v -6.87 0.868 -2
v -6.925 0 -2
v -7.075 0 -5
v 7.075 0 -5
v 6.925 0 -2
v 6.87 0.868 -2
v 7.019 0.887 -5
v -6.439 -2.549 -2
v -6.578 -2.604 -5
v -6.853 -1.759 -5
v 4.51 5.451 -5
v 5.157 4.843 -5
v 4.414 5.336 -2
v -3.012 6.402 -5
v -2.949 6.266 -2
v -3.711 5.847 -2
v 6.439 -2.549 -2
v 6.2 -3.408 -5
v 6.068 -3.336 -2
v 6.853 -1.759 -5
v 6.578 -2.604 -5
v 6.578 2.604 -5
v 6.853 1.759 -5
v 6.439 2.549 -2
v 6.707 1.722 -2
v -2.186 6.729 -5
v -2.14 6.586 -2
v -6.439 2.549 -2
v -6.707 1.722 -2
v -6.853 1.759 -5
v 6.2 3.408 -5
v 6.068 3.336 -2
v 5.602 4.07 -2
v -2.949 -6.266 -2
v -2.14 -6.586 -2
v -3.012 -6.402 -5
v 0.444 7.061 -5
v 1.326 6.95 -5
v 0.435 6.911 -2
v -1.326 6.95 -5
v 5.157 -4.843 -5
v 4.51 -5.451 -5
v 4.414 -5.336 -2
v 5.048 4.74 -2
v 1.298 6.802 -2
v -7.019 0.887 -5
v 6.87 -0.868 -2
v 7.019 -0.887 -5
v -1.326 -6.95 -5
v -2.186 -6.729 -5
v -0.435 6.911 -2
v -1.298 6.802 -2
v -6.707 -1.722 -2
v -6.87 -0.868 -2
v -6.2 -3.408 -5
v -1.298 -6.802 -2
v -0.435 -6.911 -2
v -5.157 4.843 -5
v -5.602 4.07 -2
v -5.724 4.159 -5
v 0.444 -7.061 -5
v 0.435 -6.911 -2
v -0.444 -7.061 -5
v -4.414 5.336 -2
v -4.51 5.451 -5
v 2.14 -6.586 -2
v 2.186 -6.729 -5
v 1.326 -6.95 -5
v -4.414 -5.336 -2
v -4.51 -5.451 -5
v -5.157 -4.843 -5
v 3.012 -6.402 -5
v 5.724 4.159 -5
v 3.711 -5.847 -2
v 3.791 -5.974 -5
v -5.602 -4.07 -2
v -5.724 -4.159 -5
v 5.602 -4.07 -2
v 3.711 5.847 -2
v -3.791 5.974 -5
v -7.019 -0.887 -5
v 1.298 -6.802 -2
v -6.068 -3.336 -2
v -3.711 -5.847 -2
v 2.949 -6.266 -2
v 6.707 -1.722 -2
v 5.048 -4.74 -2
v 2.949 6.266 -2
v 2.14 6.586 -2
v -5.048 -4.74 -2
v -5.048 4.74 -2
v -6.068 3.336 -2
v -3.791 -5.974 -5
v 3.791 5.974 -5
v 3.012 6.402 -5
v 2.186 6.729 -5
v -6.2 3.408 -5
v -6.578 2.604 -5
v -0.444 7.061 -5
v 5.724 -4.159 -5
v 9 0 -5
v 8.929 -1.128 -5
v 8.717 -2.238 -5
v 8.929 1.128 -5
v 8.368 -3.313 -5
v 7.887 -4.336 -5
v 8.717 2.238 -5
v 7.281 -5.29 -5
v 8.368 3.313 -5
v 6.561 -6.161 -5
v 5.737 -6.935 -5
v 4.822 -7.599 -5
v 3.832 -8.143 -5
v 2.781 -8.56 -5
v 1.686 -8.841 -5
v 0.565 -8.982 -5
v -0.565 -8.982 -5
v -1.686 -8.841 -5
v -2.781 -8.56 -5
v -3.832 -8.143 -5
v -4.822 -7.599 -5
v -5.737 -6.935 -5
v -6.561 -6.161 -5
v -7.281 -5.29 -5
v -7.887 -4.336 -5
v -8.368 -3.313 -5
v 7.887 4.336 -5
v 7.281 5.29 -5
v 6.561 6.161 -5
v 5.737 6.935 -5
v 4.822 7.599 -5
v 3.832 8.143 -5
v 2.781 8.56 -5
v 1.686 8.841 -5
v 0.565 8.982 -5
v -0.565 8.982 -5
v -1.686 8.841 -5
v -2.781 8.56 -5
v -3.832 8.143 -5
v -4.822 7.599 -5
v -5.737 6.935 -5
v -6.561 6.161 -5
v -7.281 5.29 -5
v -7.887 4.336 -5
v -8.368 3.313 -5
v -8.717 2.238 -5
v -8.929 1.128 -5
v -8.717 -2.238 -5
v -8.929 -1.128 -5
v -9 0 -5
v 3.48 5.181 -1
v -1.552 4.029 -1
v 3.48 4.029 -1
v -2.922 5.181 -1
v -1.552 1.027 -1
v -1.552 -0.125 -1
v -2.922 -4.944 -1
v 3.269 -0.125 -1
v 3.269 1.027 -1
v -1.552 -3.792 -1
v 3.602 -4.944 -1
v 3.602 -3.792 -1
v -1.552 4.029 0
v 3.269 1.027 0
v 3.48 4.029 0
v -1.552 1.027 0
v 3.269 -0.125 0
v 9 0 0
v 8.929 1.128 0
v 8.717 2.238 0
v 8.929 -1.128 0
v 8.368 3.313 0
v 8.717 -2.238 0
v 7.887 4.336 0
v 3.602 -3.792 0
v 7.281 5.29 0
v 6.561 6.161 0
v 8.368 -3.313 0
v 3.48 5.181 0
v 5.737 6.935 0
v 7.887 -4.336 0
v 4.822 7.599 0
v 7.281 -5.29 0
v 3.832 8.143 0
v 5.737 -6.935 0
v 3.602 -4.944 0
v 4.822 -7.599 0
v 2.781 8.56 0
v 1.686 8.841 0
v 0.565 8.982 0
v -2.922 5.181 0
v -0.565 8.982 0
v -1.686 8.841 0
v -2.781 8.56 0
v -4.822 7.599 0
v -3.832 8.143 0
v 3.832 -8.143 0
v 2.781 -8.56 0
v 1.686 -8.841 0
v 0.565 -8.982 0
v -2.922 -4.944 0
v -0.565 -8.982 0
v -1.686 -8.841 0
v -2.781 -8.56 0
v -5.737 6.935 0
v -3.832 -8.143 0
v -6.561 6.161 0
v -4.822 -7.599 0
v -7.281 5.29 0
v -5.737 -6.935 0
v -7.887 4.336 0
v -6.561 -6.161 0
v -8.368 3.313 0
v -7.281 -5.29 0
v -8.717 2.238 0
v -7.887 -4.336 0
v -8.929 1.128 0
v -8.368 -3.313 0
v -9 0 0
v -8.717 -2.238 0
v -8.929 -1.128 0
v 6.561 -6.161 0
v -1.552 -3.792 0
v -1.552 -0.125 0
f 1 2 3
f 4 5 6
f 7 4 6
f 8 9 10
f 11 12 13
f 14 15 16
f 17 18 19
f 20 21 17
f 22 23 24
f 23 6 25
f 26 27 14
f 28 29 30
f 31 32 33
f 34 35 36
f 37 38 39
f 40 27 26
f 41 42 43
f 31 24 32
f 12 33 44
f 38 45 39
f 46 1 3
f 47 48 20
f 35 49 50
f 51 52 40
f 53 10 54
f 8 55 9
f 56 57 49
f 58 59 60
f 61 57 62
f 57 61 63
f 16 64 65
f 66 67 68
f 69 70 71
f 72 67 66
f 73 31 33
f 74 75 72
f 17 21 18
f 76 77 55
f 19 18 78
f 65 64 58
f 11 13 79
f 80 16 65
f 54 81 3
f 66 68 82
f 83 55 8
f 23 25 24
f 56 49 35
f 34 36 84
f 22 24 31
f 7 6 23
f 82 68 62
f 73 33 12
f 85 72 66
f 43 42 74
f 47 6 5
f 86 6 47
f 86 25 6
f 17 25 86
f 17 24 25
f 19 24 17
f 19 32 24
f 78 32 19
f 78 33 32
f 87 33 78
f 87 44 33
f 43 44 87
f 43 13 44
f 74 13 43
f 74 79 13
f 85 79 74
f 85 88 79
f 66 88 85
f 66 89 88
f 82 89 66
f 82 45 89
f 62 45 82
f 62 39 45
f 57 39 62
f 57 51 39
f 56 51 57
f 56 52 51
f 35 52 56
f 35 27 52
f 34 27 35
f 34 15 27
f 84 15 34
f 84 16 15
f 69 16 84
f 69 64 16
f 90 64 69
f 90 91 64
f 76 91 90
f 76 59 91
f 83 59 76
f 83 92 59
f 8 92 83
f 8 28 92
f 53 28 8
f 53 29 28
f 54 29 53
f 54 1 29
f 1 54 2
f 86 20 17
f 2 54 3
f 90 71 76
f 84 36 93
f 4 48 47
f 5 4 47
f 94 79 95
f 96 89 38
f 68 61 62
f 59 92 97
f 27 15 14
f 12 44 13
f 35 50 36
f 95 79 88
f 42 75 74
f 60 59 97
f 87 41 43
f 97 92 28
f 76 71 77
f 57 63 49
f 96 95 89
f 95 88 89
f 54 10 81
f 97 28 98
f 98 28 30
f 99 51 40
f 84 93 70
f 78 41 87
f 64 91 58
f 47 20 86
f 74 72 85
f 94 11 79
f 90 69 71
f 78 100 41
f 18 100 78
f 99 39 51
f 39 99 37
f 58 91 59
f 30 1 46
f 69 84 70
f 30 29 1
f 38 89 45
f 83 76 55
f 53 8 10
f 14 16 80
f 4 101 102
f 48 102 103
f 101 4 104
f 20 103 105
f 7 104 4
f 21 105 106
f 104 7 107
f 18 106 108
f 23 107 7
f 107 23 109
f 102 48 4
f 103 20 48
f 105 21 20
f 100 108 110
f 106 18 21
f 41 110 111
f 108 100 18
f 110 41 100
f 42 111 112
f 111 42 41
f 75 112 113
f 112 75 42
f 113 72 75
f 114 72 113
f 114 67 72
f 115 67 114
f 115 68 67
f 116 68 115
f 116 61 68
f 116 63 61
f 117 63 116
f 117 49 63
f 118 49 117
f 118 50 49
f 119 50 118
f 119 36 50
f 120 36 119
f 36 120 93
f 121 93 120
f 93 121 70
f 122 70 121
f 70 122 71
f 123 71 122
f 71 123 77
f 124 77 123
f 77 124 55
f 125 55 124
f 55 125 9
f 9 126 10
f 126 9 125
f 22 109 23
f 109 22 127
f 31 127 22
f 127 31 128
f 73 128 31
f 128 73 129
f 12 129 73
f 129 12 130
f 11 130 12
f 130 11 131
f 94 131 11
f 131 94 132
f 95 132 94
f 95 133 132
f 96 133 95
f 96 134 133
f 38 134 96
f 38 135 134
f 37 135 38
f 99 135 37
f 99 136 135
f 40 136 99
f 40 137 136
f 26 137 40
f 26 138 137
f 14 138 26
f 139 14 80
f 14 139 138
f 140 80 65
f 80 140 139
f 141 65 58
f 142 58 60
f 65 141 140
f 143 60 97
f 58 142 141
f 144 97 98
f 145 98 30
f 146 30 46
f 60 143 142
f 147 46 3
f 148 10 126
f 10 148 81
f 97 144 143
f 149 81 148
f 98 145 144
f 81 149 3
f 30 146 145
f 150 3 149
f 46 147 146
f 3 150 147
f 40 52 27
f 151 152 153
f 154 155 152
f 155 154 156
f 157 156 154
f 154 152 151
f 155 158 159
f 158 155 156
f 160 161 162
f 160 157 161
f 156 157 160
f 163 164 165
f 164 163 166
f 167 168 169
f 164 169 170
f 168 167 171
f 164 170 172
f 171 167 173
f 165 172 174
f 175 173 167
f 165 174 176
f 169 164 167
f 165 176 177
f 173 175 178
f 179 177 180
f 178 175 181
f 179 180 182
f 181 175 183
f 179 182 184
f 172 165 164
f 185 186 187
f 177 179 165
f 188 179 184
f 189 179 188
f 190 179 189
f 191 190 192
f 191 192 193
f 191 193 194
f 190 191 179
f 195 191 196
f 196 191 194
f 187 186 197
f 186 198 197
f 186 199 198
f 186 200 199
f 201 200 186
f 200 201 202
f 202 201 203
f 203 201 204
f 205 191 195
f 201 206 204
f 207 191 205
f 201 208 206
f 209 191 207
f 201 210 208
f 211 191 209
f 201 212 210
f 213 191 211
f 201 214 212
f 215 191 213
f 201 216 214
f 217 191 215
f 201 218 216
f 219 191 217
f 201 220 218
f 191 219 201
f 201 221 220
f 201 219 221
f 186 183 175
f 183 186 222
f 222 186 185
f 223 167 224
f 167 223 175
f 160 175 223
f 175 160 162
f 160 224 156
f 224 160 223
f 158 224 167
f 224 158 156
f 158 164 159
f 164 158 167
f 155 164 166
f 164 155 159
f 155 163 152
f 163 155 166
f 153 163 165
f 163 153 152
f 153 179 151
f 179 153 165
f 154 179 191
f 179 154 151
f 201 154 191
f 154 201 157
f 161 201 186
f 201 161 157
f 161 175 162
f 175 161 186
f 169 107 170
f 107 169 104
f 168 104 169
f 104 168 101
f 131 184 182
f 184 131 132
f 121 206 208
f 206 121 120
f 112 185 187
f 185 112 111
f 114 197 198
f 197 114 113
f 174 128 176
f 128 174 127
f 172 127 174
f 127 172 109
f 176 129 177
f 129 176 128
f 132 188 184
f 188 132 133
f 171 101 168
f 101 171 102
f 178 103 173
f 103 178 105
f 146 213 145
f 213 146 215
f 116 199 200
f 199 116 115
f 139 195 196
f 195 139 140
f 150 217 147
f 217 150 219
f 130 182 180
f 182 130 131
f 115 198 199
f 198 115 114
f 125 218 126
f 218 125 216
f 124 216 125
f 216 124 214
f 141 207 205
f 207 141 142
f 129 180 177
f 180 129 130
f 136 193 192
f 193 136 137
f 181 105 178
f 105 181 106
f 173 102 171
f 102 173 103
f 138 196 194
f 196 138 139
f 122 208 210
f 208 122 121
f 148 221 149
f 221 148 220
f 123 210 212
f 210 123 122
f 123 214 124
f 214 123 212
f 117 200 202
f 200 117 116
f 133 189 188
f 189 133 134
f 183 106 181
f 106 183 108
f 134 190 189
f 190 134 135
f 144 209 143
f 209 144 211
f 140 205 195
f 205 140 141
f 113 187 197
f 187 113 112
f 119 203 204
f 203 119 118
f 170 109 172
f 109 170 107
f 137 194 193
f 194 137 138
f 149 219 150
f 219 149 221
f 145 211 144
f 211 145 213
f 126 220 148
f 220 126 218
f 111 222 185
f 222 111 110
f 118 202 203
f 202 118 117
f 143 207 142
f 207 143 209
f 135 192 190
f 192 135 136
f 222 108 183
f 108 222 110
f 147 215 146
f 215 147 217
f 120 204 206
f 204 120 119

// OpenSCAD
$fn = 50;


difference() {
	union() {
		translate(v = [0, 0, -5.0000000000]) {
			cylinder(h = 5, r = 9.0000000000);
		}
	}
	union() {
		#translate(v = [0, 0, -5.0000000000]) {
			cylinder(h = 3, r1 = 7.0750000000, r2 = 6.9250000000);
		}
		translate(v = [0, 0, -1]) {
			linear_extrude(height = 1) {
				text(font = "Impact", halign = "center", size = 10, text = "E", valign = "center");
			}
		}
	}
}
